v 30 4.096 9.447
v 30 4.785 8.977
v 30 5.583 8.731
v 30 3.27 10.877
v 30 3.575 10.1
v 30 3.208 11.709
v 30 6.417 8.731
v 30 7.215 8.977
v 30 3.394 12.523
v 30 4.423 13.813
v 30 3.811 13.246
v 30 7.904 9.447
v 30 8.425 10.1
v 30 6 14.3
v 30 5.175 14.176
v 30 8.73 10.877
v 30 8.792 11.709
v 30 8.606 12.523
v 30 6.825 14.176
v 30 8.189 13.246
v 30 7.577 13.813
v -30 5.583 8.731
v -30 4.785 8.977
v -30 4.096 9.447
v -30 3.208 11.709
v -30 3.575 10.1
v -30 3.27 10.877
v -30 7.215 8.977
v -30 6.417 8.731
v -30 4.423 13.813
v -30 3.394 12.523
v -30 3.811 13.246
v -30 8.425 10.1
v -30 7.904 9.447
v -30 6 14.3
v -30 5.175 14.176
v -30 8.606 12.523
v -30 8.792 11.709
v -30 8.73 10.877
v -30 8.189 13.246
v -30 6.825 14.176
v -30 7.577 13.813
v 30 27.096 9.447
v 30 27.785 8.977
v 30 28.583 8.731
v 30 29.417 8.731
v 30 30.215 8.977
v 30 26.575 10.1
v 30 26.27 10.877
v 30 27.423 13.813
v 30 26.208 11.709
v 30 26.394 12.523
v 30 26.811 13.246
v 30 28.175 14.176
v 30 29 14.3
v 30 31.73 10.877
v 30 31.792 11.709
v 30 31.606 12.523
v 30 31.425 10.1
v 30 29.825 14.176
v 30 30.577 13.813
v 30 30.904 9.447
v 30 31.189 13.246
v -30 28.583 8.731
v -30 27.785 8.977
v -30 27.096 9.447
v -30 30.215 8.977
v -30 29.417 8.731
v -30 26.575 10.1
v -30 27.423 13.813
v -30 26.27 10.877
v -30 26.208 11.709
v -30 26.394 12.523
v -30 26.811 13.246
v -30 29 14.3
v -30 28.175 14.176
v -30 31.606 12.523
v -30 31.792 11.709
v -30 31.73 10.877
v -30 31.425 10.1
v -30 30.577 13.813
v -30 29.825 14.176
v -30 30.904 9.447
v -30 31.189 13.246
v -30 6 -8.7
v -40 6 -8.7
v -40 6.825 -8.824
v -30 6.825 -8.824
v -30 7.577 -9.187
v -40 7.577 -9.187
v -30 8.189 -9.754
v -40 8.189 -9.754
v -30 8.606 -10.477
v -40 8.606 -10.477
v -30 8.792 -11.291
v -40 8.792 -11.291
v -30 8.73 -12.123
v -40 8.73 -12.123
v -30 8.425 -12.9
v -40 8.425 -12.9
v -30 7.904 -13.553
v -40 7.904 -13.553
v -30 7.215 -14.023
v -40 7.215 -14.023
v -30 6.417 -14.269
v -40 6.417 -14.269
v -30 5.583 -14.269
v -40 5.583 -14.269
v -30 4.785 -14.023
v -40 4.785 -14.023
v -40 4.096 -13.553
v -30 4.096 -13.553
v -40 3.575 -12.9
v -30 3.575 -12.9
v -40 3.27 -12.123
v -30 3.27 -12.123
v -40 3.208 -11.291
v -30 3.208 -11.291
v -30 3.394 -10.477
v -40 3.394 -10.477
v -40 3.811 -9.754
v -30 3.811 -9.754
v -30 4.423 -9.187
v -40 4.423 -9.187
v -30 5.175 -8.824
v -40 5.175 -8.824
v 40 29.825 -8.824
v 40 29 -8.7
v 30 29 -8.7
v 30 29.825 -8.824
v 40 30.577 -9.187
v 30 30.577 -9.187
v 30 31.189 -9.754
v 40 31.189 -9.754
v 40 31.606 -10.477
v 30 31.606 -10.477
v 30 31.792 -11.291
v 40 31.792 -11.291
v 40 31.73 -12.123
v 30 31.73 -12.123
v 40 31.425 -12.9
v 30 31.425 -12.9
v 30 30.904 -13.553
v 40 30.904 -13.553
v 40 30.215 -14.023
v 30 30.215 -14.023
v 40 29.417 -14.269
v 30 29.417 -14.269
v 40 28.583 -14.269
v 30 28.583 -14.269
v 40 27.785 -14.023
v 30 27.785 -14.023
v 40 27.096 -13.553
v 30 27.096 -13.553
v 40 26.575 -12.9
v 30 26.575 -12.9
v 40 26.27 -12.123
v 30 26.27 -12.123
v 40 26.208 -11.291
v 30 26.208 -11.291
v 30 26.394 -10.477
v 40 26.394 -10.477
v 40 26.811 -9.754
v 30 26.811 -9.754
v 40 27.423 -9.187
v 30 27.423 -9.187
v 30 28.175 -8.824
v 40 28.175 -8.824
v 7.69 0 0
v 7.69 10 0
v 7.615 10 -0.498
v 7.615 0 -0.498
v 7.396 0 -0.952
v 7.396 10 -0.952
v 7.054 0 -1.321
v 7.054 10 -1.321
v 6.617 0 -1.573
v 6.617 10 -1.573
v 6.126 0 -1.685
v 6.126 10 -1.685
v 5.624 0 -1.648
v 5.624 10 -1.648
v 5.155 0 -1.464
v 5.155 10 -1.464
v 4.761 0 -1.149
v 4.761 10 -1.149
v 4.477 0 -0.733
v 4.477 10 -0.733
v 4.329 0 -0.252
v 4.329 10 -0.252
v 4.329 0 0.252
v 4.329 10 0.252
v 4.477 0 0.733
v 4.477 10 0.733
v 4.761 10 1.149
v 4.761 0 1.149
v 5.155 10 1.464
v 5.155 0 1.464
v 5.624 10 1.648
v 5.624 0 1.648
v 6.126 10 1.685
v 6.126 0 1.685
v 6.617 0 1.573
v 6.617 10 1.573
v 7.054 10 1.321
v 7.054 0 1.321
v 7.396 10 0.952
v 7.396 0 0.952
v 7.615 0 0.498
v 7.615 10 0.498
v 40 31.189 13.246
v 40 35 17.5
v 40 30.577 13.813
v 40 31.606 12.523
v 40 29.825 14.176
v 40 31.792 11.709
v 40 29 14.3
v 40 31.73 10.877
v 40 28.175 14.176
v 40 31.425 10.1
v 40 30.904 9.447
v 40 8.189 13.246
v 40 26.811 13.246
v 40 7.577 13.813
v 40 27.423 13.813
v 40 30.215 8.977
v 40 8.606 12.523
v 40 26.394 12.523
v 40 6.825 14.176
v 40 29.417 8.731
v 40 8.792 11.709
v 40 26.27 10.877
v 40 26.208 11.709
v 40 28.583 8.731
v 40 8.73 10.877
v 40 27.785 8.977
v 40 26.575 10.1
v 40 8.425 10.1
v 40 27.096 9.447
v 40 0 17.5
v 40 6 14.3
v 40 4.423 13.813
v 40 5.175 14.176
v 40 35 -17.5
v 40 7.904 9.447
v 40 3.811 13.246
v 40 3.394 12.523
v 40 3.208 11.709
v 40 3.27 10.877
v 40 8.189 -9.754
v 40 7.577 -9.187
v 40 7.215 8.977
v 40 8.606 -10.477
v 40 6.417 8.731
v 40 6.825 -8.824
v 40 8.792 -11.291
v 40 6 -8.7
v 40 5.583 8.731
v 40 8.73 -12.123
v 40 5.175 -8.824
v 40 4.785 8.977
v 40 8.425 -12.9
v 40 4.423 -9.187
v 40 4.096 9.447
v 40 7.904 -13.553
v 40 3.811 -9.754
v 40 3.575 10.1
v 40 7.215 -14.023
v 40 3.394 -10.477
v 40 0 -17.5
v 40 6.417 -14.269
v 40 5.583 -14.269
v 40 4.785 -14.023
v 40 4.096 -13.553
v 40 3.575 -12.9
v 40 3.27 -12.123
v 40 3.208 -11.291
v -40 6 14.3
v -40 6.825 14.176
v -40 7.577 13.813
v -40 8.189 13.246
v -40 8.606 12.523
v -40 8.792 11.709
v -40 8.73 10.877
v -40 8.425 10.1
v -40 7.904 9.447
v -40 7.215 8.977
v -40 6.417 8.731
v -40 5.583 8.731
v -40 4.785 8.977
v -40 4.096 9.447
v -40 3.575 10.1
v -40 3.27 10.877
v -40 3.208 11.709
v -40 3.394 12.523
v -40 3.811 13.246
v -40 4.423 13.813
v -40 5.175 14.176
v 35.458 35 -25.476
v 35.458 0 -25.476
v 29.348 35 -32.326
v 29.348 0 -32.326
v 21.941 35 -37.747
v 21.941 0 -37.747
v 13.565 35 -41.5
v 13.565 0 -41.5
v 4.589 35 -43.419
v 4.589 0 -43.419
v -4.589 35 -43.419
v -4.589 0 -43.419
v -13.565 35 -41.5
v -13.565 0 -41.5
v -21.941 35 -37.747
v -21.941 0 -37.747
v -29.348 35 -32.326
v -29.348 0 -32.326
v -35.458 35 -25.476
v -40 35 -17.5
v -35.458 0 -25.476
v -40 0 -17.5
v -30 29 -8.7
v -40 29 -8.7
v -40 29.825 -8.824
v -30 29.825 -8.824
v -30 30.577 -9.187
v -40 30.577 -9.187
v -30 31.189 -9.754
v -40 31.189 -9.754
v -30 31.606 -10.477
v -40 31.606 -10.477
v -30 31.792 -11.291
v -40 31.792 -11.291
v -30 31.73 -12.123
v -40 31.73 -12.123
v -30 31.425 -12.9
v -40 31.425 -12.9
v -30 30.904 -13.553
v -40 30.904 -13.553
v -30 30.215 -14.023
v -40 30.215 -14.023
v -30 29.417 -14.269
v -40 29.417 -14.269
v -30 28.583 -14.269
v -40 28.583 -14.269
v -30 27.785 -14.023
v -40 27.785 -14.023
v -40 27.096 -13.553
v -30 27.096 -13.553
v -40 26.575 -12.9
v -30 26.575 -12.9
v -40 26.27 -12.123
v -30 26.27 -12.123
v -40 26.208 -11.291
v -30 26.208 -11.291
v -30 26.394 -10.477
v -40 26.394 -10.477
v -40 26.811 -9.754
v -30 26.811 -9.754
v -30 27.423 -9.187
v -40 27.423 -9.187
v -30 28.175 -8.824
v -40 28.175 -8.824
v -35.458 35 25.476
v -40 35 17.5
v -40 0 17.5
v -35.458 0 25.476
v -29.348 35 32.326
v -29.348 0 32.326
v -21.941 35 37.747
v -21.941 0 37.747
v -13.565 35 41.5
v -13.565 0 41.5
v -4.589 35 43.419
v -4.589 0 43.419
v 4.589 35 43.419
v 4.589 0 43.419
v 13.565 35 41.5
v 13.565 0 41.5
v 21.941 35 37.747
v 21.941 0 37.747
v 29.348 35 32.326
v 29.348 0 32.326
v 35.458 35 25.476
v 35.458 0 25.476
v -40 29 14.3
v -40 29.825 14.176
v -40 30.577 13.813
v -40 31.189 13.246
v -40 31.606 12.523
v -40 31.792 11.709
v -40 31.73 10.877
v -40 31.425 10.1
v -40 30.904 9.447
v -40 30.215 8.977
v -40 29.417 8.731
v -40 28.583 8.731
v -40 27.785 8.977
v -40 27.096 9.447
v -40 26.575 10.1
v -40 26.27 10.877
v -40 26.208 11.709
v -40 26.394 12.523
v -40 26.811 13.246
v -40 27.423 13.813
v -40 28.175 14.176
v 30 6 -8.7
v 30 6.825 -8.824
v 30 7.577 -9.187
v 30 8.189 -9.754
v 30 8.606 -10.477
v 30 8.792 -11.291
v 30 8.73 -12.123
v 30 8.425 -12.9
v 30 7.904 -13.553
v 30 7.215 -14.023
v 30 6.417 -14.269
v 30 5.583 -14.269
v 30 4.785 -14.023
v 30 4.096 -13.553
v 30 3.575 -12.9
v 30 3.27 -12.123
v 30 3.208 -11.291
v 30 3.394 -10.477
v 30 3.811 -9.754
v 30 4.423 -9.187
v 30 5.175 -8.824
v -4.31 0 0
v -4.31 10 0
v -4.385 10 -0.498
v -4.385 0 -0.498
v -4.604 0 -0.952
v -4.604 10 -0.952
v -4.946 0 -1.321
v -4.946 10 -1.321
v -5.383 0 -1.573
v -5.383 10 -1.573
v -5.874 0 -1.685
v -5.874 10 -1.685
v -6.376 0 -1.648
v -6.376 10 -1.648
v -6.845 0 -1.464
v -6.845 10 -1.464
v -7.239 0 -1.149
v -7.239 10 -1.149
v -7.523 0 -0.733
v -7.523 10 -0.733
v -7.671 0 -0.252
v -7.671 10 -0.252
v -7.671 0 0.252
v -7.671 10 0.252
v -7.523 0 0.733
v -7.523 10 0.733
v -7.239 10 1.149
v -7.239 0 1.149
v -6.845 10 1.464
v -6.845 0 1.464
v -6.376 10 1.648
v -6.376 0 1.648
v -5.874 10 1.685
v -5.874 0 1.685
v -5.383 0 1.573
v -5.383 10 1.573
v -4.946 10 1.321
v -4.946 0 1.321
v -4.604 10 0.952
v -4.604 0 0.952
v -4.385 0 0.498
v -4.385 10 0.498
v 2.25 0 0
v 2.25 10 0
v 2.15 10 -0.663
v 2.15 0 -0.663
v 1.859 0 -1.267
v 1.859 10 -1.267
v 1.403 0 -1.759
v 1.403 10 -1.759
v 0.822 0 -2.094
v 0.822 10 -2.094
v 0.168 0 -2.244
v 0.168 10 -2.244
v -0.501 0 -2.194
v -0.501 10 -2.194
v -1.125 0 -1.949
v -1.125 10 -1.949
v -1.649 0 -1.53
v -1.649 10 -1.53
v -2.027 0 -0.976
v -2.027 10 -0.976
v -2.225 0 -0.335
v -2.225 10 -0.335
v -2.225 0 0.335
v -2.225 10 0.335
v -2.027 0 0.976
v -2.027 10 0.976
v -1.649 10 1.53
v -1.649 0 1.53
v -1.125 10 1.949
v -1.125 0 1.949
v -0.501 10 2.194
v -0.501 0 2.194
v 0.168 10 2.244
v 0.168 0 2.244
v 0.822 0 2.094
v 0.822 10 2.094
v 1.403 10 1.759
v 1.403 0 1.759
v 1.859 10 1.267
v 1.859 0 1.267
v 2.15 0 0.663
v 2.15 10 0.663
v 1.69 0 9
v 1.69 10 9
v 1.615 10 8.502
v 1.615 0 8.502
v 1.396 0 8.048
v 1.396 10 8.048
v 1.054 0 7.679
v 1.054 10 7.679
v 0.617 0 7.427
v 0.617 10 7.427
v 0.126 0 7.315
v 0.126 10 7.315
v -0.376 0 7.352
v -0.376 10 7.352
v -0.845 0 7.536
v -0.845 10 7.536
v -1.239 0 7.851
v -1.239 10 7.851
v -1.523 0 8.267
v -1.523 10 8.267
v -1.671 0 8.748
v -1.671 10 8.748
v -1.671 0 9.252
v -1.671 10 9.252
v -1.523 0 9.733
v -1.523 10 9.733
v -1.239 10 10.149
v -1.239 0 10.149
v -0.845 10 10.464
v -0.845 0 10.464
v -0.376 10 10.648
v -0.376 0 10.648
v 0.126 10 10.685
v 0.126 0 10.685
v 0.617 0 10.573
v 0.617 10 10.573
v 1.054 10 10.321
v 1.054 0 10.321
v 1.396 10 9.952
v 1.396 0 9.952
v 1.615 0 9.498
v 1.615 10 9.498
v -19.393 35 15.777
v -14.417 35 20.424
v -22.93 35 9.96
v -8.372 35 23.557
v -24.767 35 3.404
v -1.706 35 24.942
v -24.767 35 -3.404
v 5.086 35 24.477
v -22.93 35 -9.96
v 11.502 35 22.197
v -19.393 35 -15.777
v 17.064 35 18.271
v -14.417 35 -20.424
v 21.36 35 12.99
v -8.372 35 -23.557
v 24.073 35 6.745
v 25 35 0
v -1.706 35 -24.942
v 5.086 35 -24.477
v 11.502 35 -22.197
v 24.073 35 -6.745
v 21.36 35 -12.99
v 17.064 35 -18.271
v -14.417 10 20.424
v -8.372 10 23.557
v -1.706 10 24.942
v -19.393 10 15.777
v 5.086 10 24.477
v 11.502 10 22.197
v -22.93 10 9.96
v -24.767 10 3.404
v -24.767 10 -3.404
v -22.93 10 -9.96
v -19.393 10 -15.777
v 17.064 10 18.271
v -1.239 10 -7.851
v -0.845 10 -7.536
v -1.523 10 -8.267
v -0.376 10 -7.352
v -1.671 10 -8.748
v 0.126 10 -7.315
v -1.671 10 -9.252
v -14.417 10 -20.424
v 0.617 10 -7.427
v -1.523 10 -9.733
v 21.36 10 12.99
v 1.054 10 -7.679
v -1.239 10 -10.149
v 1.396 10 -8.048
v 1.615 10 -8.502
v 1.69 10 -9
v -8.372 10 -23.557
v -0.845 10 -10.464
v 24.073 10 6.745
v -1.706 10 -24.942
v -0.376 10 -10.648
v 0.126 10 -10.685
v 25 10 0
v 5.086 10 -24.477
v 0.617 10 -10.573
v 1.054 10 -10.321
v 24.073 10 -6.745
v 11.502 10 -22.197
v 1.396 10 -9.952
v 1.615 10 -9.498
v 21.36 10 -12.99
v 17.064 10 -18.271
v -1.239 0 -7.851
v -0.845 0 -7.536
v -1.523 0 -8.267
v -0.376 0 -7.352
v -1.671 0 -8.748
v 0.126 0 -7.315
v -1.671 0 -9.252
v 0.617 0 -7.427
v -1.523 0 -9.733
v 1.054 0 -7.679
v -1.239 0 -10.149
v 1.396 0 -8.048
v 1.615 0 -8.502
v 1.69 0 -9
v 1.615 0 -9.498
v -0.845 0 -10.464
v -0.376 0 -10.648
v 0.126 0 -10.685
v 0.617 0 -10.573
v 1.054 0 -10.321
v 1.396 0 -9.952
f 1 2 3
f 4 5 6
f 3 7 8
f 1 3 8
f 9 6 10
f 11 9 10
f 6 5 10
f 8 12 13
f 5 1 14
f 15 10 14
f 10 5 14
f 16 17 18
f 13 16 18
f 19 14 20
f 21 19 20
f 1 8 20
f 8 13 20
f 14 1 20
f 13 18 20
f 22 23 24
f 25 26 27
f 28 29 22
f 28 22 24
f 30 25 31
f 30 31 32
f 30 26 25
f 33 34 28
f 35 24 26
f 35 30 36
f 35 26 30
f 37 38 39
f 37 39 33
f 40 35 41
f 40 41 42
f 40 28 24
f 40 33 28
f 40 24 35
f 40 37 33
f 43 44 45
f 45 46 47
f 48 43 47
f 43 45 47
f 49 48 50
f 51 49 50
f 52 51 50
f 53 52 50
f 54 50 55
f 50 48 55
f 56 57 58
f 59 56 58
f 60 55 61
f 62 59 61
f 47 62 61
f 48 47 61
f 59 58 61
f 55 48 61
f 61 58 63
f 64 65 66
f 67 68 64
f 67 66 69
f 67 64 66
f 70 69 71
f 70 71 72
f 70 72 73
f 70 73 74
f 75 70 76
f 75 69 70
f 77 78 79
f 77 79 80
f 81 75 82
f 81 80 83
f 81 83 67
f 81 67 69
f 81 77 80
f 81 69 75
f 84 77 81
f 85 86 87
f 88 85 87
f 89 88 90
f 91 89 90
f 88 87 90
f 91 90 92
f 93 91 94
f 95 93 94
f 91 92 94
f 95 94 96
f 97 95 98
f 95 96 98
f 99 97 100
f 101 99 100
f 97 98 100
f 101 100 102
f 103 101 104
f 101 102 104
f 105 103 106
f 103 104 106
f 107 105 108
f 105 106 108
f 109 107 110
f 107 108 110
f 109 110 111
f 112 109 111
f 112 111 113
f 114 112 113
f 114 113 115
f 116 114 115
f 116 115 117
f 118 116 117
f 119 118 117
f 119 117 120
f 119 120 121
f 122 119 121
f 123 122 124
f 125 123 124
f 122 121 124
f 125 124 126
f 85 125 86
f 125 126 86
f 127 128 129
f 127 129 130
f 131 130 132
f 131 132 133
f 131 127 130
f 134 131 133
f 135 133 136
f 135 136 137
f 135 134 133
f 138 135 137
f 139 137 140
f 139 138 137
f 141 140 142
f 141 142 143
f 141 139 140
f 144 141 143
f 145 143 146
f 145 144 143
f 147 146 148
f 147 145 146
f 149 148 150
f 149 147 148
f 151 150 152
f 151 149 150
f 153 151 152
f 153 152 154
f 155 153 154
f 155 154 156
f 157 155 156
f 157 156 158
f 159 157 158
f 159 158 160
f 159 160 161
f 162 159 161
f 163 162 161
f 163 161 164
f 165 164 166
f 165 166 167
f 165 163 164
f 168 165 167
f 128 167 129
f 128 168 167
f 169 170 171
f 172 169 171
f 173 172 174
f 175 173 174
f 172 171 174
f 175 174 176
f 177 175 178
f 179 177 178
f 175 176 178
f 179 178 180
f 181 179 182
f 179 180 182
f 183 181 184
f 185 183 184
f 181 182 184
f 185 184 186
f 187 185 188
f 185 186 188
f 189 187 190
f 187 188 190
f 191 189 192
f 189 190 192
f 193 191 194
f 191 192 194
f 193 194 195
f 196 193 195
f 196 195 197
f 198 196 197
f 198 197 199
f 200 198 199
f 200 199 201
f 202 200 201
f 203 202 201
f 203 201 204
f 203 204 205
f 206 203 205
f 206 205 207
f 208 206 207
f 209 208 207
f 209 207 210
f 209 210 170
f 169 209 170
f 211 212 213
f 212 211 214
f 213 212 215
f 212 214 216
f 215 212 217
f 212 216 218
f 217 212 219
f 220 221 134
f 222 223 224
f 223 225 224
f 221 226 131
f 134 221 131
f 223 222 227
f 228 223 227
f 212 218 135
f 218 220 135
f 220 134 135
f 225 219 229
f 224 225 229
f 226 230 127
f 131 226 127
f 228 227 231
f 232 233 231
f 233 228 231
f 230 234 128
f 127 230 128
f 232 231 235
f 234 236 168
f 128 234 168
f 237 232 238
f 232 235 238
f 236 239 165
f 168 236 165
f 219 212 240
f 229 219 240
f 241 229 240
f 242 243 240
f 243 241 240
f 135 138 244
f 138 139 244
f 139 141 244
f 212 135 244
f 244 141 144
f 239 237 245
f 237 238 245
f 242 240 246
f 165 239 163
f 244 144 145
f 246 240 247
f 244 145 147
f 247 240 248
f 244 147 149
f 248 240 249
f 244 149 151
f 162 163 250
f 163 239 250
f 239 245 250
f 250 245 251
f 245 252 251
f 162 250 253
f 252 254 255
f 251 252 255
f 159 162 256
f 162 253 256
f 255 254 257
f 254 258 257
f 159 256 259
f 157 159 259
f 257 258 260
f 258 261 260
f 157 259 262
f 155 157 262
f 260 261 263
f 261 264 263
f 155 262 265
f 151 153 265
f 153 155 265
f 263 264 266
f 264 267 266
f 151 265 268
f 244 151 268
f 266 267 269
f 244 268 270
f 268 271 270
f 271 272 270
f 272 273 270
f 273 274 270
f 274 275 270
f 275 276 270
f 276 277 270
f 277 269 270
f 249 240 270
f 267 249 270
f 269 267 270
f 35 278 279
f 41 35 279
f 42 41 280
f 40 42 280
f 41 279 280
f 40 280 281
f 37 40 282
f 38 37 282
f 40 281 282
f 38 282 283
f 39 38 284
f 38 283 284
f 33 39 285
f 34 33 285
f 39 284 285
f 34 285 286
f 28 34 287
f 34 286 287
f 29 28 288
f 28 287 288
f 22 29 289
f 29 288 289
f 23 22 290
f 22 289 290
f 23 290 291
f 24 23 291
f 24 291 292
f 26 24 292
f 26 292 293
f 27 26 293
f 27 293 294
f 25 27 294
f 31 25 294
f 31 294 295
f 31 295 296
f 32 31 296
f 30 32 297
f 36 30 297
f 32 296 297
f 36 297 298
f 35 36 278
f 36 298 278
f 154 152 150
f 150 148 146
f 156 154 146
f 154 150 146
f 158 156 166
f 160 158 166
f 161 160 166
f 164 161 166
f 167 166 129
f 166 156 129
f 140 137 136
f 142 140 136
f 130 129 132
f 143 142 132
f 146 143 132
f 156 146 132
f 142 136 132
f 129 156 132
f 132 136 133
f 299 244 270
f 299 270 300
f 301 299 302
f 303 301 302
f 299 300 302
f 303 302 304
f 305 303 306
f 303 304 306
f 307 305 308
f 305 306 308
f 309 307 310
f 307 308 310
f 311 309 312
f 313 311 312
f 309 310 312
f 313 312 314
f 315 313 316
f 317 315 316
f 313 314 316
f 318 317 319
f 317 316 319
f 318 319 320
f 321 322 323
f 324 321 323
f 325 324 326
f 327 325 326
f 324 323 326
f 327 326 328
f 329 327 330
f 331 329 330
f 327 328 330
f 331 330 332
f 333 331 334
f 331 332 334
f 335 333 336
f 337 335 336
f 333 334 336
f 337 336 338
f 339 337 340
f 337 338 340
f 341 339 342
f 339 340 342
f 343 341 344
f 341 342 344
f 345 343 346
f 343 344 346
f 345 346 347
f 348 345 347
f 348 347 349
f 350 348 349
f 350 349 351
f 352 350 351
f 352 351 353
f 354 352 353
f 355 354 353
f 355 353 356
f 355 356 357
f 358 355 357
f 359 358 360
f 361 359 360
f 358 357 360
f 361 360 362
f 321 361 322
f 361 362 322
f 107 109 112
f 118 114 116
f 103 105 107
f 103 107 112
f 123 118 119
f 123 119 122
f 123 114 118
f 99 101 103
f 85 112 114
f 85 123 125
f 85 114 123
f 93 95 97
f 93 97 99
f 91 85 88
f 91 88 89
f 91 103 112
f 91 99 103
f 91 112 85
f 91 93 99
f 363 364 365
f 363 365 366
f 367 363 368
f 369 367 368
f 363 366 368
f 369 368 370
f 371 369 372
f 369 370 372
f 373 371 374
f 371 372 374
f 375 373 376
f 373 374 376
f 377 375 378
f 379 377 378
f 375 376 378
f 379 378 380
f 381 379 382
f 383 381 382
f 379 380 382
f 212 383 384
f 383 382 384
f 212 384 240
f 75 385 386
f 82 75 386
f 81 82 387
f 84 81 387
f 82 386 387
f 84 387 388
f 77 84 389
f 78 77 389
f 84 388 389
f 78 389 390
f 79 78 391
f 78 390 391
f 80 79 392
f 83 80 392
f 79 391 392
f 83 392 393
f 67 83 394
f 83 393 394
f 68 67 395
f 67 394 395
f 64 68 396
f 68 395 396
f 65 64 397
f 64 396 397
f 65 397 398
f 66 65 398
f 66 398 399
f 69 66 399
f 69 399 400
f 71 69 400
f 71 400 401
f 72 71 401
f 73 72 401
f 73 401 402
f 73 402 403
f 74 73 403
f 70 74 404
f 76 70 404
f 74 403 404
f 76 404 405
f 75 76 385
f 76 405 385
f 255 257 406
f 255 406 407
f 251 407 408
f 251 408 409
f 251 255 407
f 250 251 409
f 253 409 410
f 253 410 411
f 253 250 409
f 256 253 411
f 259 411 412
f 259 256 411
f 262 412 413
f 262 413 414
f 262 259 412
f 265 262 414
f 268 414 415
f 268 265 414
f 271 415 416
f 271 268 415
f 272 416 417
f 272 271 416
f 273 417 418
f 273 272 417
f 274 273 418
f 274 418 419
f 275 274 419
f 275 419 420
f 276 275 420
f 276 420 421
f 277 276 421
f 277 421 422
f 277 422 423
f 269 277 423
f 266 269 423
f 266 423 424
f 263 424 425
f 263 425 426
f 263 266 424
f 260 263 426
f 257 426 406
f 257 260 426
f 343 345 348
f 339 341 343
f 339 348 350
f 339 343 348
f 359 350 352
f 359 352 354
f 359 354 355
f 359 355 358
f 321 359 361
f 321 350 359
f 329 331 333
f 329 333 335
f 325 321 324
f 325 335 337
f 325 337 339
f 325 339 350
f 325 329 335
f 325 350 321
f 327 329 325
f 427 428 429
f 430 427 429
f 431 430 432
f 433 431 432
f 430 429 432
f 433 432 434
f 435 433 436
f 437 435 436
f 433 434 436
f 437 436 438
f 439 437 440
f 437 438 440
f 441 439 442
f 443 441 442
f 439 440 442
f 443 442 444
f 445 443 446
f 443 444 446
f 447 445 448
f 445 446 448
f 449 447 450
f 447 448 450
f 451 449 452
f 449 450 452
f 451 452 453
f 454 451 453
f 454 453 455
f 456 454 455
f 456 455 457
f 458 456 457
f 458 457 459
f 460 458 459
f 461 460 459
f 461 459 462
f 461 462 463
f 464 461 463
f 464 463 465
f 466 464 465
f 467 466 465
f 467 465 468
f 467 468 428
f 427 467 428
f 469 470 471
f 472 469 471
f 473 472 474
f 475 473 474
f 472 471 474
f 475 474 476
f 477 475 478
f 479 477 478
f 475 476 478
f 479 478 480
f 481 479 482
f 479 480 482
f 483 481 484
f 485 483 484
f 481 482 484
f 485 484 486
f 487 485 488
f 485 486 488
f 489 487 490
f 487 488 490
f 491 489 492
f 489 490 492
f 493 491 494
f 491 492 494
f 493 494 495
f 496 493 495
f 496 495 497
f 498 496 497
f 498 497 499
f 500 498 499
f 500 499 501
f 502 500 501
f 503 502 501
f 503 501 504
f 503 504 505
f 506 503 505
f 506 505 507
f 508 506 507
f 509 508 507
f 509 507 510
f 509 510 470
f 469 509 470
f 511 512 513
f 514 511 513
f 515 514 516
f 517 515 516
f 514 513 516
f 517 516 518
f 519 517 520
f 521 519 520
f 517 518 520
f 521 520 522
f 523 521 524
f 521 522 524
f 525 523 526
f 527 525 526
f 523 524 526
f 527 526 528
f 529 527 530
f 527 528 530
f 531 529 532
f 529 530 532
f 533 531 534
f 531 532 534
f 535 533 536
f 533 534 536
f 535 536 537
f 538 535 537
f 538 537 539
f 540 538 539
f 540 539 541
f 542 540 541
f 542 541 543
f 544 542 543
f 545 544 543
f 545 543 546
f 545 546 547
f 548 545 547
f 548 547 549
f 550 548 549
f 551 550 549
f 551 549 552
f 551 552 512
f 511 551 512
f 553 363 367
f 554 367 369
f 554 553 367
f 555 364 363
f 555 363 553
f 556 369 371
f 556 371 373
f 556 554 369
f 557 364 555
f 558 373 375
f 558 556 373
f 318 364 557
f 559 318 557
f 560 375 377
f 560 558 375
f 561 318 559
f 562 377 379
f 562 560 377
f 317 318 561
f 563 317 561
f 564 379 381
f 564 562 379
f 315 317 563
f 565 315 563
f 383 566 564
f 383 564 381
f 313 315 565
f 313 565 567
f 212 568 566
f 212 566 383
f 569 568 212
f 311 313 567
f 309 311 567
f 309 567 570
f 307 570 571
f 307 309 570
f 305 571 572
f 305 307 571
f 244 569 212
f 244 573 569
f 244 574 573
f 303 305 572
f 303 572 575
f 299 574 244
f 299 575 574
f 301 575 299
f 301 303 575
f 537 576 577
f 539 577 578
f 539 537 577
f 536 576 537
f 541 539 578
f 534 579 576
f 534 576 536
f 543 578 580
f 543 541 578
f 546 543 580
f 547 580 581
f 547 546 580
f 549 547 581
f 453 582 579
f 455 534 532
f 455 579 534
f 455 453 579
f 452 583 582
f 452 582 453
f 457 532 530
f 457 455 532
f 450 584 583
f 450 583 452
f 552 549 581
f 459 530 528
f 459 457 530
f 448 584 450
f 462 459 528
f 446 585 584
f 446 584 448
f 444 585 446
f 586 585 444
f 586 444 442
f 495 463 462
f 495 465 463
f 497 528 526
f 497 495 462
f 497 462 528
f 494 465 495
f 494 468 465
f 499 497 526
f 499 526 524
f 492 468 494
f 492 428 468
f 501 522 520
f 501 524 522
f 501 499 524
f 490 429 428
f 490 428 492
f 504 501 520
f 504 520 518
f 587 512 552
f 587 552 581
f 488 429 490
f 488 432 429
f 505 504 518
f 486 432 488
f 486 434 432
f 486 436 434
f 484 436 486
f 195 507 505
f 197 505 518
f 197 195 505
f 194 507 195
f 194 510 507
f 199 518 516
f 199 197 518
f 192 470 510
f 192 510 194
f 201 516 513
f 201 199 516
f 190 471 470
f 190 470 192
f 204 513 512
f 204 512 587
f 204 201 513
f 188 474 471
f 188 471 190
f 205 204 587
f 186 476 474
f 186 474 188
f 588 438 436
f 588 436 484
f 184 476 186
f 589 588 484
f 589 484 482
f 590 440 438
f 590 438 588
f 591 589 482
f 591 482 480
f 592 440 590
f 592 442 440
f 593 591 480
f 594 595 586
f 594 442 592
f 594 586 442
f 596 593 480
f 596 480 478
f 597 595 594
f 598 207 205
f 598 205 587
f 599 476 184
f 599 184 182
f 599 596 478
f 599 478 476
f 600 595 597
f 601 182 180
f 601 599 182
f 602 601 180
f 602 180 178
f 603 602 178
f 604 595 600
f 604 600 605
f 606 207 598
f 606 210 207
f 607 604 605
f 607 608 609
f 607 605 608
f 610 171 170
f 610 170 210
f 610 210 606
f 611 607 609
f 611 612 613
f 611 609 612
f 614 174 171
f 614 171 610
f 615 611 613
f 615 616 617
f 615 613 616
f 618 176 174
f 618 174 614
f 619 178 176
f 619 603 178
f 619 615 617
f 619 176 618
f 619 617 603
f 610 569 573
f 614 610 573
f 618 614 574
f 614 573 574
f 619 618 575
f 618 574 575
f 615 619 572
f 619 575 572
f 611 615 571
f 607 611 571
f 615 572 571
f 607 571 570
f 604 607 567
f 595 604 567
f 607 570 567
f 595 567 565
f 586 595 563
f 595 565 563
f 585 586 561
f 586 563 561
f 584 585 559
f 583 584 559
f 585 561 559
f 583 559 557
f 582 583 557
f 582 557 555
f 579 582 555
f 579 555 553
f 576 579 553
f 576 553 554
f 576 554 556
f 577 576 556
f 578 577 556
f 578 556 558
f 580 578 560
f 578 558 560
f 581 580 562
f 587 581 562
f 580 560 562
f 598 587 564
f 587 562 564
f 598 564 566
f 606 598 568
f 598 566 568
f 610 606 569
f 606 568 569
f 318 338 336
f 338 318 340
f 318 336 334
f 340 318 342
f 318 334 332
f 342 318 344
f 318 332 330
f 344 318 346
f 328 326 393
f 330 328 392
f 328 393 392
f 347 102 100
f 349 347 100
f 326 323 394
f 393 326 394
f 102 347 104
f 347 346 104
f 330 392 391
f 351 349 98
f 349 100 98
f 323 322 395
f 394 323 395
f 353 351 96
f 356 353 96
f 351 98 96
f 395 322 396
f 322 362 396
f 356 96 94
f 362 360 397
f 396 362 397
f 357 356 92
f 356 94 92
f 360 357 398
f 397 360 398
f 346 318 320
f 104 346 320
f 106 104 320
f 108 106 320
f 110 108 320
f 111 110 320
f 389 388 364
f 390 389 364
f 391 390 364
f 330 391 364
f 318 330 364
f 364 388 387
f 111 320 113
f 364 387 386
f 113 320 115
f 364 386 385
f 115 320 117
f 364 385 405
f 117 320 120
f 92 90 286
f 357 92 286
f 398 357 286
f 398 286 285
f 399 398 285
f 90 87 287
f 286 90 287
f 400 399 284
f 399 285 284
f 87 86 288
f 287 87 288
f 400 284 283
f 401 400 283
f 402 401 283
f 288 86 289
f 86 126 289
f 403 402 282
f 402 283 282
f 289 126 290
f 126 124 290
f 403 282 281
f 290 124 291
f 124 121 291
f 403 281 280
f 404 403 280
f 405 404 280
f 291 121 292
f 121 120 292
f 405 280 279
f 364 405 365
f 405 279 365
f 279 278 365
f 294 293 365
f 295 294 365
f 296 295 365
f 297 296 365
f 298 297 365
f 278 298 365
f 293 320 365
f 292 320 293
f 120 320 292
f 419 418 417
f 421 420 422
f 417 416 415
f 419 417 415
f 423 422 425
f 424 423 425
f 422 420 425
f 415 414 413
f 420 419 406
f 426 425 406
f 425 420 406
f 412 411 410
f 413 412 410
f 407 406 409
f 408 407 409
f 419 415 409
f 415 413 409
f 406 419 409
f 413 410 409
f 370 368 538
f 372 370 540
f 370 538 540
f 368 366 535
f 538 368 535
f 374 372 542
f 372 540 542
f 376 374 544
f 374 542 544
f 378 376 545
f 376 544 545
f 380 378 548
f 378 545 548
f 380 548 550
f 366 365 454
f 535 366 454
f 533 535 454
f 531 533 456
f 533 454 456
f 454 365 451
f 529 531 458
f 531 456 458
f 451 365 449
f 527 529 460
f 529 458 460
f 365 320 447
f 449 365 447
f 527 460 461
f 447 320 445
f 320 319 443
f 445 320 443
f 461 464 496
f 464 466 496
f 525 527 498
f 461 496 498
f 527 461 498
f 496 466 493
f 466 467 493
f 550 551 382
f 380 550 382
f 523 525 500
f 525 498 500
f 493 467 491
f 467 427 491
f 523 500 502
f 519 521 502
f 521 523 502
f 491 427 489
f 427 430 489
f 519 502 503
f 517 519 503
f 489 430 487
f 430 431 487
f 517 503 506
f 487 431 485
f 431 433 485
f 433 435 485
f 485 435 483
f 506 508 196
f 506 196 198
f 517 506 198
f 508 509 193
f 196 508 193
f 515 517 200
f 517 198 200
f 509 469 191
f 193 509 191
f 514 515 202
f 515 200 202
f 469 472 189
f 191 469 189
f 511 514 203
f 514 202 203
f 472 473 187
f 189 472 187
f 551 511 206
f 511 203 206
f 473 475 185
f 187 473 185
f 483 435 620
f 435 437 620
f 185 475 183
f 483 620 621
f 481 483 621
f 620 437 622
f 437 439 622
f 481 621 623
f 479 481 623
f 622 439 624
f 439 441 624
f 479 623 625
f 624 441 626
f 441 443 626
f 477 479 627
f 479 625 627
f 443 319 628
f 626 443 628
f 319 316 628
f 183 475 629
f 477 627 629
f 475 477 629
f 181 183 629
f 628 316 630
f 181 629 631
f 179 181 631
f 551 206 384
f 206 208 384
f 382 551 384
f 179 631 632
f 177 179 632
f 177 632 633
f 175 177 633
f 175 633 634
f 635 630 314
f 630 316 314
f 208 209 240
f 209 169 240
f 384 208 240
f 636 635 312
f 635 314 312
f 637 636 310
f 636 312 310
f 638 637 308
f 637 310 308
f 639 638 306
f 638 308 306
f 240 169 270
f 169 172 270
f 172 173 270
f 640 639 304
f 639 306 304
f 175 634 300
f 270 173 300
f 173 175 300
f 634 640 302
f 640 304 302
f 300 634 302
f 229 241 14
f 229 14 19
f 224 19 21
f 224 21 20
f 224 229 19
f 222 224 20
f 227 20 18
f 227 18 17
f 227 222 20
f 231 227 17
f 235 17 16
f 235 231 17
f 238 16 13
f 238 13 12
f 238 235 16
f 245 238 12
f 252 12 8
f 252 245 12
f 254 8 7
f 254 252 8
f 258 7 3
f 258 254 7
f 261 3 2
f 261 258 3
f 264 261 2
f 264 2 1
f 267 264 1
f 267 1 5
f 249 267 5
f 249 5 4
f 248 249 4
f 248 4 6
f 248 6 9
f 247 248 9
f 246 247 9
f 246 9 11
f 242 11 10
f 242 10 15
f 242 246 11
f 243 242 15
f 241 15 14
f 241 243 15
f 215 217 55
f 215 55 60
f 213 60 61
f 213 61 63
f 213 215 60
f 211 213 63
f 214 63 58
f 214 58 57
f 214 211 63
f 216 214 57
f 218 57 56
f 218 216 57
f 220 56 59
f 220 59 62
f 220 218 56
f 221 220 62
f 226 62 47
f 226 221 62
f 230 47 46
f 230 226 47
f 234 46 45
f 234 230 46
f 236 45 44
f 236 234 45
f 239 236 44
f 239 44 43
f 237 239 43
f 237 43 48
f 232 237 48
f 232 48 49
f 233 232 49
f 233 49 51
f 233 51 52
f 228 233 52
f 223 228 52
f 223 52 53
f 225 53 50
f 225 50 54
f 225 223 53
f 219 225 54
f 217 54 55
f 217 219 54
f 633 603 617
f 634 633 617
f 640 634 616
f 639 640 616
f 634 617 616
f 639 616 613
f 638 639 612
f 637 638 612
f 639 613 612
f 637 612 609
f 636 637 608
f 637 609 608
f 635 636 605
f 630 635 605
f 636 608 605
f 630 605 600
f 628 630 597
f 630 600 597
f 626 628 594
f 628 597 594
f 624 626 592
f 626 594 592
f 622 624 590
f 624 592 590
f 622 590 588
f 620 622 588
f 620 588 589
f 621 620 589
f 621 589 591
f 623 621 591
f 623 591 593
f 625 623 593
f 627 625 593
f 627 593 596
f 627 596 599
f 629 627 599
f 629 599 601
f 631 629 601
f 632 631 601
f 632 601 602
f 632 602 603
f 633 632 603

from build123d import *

# Parameters (mm, degrees)
BOSS_EXTRUDE1_DEPTH = 35
SKETCH2_R           = 2.8
CUT_EXTRUDE1_DEPTH  = 10
CUT_EXTRUDE2_START  = -80
SKETCH2_2_R         = 2.8
CUT_EXTRUDE2_DEPTH  = 10
SKETCH3_R           = 1.69
SKETCH3_R_2         = 2.25
CUT_EXTRUDE3_DEPTH  = 36
SKETCH4_R           = 25
CUT_EXTRUDE4_DEPTH  = 25


with BuildPart() as part:
    # Sketch1 → Boss-Extrude1 (new body)
    with BuildSketch(Plane(origin=(0, 0, 0), x_dir=(1, 0, 0), z_dir=(0, 1, 0))):
        with BuildLine():
            Line((-40, 17.5), (-40, -17.5))
            ThreePointArc((-40, -17.5), (0, -43.660622991), (40, -17.5))
            Line((40, -17.5), (40, 17.5))
            ThreePointArc((40, 17.5), (0, 43.660622991), (-40, 17.5))
        make_face()
    extrude(amount=BOSS_EXTRUDE1_DEPTH)

    # Sketch2 → Cut-Extrude1 (cut)
    with BuildSketch(Plane.ZY.offset(40)):
        with Locations((-11.5, 29)):
            Circle(SKETCH2_R)
        with Locations((11.5, 29)):
            Circle(SKETCH2_R)
        with Locations((-11.5, 6)):
            Circle(SKETCH2_R)
        with Locations((11.5, 6)):
            Circle(SKETCH2_R)
    extrude(amount=-CUT_EXTRUDE1_DEPTH, mode=Mode.SUBTRACT)

    # Sketch2<2> → Cut-Extrude2 (cut)
    with BuildSketch(Plane.ZY.offset(40).offset(CUT_EXTRUDE2_START)):
        with Locations((-11.5, 29)):
            Circle(SKETCH2_2_R)
        with Locations((11.5, 29)):
            Circle(SKETCH2_2_R)
        with Locations((-11.5, 6)):
            Circle(SKETCH2_2_R)
        with Locations((11.5, 6)):
            Circle(SKETCH2_2_R)
    extrude(amount=CUT_EXTRUDE2_DEPTH, mode=Mode.SUBTRACT)

    # Sketch3 → Cut-Extrude3 (cut, through all)
    with BuildSketch(Plane(origin=(0, 35, 0), x_dir=(1, 0, 0), z_dir=(0, 1, 0))):
        with Locations((0, 9)):
            Circle(SKETCH3_R)
        with Locations((6, 0)):
            Circle(SKETCH3_R)
        with Locations((0, -9)):
            Circle(SKETCH3_R)
        with Locations((-6, 0)):
            Circle(SKETCH3_R)
        Circle(SKETCH3_R_2)
    extrude(amount=-CUT_EXTRUDE3_DEPTH, mode=Mode.SUBTRACT)

    # Sketch4 → Cut-Extrude4 (cut)
    with BuildSketch(Plane(origin=(0, 35, 0), x_dir=(1, 0, 0), z_dir=(0, 1, 0))):
        Circle(SKETCH4_R)
    extrude(amount=-CUT_EXTRUDE4_DEPTH, mode=Mode.SUBTRACT)


solid = part.part
